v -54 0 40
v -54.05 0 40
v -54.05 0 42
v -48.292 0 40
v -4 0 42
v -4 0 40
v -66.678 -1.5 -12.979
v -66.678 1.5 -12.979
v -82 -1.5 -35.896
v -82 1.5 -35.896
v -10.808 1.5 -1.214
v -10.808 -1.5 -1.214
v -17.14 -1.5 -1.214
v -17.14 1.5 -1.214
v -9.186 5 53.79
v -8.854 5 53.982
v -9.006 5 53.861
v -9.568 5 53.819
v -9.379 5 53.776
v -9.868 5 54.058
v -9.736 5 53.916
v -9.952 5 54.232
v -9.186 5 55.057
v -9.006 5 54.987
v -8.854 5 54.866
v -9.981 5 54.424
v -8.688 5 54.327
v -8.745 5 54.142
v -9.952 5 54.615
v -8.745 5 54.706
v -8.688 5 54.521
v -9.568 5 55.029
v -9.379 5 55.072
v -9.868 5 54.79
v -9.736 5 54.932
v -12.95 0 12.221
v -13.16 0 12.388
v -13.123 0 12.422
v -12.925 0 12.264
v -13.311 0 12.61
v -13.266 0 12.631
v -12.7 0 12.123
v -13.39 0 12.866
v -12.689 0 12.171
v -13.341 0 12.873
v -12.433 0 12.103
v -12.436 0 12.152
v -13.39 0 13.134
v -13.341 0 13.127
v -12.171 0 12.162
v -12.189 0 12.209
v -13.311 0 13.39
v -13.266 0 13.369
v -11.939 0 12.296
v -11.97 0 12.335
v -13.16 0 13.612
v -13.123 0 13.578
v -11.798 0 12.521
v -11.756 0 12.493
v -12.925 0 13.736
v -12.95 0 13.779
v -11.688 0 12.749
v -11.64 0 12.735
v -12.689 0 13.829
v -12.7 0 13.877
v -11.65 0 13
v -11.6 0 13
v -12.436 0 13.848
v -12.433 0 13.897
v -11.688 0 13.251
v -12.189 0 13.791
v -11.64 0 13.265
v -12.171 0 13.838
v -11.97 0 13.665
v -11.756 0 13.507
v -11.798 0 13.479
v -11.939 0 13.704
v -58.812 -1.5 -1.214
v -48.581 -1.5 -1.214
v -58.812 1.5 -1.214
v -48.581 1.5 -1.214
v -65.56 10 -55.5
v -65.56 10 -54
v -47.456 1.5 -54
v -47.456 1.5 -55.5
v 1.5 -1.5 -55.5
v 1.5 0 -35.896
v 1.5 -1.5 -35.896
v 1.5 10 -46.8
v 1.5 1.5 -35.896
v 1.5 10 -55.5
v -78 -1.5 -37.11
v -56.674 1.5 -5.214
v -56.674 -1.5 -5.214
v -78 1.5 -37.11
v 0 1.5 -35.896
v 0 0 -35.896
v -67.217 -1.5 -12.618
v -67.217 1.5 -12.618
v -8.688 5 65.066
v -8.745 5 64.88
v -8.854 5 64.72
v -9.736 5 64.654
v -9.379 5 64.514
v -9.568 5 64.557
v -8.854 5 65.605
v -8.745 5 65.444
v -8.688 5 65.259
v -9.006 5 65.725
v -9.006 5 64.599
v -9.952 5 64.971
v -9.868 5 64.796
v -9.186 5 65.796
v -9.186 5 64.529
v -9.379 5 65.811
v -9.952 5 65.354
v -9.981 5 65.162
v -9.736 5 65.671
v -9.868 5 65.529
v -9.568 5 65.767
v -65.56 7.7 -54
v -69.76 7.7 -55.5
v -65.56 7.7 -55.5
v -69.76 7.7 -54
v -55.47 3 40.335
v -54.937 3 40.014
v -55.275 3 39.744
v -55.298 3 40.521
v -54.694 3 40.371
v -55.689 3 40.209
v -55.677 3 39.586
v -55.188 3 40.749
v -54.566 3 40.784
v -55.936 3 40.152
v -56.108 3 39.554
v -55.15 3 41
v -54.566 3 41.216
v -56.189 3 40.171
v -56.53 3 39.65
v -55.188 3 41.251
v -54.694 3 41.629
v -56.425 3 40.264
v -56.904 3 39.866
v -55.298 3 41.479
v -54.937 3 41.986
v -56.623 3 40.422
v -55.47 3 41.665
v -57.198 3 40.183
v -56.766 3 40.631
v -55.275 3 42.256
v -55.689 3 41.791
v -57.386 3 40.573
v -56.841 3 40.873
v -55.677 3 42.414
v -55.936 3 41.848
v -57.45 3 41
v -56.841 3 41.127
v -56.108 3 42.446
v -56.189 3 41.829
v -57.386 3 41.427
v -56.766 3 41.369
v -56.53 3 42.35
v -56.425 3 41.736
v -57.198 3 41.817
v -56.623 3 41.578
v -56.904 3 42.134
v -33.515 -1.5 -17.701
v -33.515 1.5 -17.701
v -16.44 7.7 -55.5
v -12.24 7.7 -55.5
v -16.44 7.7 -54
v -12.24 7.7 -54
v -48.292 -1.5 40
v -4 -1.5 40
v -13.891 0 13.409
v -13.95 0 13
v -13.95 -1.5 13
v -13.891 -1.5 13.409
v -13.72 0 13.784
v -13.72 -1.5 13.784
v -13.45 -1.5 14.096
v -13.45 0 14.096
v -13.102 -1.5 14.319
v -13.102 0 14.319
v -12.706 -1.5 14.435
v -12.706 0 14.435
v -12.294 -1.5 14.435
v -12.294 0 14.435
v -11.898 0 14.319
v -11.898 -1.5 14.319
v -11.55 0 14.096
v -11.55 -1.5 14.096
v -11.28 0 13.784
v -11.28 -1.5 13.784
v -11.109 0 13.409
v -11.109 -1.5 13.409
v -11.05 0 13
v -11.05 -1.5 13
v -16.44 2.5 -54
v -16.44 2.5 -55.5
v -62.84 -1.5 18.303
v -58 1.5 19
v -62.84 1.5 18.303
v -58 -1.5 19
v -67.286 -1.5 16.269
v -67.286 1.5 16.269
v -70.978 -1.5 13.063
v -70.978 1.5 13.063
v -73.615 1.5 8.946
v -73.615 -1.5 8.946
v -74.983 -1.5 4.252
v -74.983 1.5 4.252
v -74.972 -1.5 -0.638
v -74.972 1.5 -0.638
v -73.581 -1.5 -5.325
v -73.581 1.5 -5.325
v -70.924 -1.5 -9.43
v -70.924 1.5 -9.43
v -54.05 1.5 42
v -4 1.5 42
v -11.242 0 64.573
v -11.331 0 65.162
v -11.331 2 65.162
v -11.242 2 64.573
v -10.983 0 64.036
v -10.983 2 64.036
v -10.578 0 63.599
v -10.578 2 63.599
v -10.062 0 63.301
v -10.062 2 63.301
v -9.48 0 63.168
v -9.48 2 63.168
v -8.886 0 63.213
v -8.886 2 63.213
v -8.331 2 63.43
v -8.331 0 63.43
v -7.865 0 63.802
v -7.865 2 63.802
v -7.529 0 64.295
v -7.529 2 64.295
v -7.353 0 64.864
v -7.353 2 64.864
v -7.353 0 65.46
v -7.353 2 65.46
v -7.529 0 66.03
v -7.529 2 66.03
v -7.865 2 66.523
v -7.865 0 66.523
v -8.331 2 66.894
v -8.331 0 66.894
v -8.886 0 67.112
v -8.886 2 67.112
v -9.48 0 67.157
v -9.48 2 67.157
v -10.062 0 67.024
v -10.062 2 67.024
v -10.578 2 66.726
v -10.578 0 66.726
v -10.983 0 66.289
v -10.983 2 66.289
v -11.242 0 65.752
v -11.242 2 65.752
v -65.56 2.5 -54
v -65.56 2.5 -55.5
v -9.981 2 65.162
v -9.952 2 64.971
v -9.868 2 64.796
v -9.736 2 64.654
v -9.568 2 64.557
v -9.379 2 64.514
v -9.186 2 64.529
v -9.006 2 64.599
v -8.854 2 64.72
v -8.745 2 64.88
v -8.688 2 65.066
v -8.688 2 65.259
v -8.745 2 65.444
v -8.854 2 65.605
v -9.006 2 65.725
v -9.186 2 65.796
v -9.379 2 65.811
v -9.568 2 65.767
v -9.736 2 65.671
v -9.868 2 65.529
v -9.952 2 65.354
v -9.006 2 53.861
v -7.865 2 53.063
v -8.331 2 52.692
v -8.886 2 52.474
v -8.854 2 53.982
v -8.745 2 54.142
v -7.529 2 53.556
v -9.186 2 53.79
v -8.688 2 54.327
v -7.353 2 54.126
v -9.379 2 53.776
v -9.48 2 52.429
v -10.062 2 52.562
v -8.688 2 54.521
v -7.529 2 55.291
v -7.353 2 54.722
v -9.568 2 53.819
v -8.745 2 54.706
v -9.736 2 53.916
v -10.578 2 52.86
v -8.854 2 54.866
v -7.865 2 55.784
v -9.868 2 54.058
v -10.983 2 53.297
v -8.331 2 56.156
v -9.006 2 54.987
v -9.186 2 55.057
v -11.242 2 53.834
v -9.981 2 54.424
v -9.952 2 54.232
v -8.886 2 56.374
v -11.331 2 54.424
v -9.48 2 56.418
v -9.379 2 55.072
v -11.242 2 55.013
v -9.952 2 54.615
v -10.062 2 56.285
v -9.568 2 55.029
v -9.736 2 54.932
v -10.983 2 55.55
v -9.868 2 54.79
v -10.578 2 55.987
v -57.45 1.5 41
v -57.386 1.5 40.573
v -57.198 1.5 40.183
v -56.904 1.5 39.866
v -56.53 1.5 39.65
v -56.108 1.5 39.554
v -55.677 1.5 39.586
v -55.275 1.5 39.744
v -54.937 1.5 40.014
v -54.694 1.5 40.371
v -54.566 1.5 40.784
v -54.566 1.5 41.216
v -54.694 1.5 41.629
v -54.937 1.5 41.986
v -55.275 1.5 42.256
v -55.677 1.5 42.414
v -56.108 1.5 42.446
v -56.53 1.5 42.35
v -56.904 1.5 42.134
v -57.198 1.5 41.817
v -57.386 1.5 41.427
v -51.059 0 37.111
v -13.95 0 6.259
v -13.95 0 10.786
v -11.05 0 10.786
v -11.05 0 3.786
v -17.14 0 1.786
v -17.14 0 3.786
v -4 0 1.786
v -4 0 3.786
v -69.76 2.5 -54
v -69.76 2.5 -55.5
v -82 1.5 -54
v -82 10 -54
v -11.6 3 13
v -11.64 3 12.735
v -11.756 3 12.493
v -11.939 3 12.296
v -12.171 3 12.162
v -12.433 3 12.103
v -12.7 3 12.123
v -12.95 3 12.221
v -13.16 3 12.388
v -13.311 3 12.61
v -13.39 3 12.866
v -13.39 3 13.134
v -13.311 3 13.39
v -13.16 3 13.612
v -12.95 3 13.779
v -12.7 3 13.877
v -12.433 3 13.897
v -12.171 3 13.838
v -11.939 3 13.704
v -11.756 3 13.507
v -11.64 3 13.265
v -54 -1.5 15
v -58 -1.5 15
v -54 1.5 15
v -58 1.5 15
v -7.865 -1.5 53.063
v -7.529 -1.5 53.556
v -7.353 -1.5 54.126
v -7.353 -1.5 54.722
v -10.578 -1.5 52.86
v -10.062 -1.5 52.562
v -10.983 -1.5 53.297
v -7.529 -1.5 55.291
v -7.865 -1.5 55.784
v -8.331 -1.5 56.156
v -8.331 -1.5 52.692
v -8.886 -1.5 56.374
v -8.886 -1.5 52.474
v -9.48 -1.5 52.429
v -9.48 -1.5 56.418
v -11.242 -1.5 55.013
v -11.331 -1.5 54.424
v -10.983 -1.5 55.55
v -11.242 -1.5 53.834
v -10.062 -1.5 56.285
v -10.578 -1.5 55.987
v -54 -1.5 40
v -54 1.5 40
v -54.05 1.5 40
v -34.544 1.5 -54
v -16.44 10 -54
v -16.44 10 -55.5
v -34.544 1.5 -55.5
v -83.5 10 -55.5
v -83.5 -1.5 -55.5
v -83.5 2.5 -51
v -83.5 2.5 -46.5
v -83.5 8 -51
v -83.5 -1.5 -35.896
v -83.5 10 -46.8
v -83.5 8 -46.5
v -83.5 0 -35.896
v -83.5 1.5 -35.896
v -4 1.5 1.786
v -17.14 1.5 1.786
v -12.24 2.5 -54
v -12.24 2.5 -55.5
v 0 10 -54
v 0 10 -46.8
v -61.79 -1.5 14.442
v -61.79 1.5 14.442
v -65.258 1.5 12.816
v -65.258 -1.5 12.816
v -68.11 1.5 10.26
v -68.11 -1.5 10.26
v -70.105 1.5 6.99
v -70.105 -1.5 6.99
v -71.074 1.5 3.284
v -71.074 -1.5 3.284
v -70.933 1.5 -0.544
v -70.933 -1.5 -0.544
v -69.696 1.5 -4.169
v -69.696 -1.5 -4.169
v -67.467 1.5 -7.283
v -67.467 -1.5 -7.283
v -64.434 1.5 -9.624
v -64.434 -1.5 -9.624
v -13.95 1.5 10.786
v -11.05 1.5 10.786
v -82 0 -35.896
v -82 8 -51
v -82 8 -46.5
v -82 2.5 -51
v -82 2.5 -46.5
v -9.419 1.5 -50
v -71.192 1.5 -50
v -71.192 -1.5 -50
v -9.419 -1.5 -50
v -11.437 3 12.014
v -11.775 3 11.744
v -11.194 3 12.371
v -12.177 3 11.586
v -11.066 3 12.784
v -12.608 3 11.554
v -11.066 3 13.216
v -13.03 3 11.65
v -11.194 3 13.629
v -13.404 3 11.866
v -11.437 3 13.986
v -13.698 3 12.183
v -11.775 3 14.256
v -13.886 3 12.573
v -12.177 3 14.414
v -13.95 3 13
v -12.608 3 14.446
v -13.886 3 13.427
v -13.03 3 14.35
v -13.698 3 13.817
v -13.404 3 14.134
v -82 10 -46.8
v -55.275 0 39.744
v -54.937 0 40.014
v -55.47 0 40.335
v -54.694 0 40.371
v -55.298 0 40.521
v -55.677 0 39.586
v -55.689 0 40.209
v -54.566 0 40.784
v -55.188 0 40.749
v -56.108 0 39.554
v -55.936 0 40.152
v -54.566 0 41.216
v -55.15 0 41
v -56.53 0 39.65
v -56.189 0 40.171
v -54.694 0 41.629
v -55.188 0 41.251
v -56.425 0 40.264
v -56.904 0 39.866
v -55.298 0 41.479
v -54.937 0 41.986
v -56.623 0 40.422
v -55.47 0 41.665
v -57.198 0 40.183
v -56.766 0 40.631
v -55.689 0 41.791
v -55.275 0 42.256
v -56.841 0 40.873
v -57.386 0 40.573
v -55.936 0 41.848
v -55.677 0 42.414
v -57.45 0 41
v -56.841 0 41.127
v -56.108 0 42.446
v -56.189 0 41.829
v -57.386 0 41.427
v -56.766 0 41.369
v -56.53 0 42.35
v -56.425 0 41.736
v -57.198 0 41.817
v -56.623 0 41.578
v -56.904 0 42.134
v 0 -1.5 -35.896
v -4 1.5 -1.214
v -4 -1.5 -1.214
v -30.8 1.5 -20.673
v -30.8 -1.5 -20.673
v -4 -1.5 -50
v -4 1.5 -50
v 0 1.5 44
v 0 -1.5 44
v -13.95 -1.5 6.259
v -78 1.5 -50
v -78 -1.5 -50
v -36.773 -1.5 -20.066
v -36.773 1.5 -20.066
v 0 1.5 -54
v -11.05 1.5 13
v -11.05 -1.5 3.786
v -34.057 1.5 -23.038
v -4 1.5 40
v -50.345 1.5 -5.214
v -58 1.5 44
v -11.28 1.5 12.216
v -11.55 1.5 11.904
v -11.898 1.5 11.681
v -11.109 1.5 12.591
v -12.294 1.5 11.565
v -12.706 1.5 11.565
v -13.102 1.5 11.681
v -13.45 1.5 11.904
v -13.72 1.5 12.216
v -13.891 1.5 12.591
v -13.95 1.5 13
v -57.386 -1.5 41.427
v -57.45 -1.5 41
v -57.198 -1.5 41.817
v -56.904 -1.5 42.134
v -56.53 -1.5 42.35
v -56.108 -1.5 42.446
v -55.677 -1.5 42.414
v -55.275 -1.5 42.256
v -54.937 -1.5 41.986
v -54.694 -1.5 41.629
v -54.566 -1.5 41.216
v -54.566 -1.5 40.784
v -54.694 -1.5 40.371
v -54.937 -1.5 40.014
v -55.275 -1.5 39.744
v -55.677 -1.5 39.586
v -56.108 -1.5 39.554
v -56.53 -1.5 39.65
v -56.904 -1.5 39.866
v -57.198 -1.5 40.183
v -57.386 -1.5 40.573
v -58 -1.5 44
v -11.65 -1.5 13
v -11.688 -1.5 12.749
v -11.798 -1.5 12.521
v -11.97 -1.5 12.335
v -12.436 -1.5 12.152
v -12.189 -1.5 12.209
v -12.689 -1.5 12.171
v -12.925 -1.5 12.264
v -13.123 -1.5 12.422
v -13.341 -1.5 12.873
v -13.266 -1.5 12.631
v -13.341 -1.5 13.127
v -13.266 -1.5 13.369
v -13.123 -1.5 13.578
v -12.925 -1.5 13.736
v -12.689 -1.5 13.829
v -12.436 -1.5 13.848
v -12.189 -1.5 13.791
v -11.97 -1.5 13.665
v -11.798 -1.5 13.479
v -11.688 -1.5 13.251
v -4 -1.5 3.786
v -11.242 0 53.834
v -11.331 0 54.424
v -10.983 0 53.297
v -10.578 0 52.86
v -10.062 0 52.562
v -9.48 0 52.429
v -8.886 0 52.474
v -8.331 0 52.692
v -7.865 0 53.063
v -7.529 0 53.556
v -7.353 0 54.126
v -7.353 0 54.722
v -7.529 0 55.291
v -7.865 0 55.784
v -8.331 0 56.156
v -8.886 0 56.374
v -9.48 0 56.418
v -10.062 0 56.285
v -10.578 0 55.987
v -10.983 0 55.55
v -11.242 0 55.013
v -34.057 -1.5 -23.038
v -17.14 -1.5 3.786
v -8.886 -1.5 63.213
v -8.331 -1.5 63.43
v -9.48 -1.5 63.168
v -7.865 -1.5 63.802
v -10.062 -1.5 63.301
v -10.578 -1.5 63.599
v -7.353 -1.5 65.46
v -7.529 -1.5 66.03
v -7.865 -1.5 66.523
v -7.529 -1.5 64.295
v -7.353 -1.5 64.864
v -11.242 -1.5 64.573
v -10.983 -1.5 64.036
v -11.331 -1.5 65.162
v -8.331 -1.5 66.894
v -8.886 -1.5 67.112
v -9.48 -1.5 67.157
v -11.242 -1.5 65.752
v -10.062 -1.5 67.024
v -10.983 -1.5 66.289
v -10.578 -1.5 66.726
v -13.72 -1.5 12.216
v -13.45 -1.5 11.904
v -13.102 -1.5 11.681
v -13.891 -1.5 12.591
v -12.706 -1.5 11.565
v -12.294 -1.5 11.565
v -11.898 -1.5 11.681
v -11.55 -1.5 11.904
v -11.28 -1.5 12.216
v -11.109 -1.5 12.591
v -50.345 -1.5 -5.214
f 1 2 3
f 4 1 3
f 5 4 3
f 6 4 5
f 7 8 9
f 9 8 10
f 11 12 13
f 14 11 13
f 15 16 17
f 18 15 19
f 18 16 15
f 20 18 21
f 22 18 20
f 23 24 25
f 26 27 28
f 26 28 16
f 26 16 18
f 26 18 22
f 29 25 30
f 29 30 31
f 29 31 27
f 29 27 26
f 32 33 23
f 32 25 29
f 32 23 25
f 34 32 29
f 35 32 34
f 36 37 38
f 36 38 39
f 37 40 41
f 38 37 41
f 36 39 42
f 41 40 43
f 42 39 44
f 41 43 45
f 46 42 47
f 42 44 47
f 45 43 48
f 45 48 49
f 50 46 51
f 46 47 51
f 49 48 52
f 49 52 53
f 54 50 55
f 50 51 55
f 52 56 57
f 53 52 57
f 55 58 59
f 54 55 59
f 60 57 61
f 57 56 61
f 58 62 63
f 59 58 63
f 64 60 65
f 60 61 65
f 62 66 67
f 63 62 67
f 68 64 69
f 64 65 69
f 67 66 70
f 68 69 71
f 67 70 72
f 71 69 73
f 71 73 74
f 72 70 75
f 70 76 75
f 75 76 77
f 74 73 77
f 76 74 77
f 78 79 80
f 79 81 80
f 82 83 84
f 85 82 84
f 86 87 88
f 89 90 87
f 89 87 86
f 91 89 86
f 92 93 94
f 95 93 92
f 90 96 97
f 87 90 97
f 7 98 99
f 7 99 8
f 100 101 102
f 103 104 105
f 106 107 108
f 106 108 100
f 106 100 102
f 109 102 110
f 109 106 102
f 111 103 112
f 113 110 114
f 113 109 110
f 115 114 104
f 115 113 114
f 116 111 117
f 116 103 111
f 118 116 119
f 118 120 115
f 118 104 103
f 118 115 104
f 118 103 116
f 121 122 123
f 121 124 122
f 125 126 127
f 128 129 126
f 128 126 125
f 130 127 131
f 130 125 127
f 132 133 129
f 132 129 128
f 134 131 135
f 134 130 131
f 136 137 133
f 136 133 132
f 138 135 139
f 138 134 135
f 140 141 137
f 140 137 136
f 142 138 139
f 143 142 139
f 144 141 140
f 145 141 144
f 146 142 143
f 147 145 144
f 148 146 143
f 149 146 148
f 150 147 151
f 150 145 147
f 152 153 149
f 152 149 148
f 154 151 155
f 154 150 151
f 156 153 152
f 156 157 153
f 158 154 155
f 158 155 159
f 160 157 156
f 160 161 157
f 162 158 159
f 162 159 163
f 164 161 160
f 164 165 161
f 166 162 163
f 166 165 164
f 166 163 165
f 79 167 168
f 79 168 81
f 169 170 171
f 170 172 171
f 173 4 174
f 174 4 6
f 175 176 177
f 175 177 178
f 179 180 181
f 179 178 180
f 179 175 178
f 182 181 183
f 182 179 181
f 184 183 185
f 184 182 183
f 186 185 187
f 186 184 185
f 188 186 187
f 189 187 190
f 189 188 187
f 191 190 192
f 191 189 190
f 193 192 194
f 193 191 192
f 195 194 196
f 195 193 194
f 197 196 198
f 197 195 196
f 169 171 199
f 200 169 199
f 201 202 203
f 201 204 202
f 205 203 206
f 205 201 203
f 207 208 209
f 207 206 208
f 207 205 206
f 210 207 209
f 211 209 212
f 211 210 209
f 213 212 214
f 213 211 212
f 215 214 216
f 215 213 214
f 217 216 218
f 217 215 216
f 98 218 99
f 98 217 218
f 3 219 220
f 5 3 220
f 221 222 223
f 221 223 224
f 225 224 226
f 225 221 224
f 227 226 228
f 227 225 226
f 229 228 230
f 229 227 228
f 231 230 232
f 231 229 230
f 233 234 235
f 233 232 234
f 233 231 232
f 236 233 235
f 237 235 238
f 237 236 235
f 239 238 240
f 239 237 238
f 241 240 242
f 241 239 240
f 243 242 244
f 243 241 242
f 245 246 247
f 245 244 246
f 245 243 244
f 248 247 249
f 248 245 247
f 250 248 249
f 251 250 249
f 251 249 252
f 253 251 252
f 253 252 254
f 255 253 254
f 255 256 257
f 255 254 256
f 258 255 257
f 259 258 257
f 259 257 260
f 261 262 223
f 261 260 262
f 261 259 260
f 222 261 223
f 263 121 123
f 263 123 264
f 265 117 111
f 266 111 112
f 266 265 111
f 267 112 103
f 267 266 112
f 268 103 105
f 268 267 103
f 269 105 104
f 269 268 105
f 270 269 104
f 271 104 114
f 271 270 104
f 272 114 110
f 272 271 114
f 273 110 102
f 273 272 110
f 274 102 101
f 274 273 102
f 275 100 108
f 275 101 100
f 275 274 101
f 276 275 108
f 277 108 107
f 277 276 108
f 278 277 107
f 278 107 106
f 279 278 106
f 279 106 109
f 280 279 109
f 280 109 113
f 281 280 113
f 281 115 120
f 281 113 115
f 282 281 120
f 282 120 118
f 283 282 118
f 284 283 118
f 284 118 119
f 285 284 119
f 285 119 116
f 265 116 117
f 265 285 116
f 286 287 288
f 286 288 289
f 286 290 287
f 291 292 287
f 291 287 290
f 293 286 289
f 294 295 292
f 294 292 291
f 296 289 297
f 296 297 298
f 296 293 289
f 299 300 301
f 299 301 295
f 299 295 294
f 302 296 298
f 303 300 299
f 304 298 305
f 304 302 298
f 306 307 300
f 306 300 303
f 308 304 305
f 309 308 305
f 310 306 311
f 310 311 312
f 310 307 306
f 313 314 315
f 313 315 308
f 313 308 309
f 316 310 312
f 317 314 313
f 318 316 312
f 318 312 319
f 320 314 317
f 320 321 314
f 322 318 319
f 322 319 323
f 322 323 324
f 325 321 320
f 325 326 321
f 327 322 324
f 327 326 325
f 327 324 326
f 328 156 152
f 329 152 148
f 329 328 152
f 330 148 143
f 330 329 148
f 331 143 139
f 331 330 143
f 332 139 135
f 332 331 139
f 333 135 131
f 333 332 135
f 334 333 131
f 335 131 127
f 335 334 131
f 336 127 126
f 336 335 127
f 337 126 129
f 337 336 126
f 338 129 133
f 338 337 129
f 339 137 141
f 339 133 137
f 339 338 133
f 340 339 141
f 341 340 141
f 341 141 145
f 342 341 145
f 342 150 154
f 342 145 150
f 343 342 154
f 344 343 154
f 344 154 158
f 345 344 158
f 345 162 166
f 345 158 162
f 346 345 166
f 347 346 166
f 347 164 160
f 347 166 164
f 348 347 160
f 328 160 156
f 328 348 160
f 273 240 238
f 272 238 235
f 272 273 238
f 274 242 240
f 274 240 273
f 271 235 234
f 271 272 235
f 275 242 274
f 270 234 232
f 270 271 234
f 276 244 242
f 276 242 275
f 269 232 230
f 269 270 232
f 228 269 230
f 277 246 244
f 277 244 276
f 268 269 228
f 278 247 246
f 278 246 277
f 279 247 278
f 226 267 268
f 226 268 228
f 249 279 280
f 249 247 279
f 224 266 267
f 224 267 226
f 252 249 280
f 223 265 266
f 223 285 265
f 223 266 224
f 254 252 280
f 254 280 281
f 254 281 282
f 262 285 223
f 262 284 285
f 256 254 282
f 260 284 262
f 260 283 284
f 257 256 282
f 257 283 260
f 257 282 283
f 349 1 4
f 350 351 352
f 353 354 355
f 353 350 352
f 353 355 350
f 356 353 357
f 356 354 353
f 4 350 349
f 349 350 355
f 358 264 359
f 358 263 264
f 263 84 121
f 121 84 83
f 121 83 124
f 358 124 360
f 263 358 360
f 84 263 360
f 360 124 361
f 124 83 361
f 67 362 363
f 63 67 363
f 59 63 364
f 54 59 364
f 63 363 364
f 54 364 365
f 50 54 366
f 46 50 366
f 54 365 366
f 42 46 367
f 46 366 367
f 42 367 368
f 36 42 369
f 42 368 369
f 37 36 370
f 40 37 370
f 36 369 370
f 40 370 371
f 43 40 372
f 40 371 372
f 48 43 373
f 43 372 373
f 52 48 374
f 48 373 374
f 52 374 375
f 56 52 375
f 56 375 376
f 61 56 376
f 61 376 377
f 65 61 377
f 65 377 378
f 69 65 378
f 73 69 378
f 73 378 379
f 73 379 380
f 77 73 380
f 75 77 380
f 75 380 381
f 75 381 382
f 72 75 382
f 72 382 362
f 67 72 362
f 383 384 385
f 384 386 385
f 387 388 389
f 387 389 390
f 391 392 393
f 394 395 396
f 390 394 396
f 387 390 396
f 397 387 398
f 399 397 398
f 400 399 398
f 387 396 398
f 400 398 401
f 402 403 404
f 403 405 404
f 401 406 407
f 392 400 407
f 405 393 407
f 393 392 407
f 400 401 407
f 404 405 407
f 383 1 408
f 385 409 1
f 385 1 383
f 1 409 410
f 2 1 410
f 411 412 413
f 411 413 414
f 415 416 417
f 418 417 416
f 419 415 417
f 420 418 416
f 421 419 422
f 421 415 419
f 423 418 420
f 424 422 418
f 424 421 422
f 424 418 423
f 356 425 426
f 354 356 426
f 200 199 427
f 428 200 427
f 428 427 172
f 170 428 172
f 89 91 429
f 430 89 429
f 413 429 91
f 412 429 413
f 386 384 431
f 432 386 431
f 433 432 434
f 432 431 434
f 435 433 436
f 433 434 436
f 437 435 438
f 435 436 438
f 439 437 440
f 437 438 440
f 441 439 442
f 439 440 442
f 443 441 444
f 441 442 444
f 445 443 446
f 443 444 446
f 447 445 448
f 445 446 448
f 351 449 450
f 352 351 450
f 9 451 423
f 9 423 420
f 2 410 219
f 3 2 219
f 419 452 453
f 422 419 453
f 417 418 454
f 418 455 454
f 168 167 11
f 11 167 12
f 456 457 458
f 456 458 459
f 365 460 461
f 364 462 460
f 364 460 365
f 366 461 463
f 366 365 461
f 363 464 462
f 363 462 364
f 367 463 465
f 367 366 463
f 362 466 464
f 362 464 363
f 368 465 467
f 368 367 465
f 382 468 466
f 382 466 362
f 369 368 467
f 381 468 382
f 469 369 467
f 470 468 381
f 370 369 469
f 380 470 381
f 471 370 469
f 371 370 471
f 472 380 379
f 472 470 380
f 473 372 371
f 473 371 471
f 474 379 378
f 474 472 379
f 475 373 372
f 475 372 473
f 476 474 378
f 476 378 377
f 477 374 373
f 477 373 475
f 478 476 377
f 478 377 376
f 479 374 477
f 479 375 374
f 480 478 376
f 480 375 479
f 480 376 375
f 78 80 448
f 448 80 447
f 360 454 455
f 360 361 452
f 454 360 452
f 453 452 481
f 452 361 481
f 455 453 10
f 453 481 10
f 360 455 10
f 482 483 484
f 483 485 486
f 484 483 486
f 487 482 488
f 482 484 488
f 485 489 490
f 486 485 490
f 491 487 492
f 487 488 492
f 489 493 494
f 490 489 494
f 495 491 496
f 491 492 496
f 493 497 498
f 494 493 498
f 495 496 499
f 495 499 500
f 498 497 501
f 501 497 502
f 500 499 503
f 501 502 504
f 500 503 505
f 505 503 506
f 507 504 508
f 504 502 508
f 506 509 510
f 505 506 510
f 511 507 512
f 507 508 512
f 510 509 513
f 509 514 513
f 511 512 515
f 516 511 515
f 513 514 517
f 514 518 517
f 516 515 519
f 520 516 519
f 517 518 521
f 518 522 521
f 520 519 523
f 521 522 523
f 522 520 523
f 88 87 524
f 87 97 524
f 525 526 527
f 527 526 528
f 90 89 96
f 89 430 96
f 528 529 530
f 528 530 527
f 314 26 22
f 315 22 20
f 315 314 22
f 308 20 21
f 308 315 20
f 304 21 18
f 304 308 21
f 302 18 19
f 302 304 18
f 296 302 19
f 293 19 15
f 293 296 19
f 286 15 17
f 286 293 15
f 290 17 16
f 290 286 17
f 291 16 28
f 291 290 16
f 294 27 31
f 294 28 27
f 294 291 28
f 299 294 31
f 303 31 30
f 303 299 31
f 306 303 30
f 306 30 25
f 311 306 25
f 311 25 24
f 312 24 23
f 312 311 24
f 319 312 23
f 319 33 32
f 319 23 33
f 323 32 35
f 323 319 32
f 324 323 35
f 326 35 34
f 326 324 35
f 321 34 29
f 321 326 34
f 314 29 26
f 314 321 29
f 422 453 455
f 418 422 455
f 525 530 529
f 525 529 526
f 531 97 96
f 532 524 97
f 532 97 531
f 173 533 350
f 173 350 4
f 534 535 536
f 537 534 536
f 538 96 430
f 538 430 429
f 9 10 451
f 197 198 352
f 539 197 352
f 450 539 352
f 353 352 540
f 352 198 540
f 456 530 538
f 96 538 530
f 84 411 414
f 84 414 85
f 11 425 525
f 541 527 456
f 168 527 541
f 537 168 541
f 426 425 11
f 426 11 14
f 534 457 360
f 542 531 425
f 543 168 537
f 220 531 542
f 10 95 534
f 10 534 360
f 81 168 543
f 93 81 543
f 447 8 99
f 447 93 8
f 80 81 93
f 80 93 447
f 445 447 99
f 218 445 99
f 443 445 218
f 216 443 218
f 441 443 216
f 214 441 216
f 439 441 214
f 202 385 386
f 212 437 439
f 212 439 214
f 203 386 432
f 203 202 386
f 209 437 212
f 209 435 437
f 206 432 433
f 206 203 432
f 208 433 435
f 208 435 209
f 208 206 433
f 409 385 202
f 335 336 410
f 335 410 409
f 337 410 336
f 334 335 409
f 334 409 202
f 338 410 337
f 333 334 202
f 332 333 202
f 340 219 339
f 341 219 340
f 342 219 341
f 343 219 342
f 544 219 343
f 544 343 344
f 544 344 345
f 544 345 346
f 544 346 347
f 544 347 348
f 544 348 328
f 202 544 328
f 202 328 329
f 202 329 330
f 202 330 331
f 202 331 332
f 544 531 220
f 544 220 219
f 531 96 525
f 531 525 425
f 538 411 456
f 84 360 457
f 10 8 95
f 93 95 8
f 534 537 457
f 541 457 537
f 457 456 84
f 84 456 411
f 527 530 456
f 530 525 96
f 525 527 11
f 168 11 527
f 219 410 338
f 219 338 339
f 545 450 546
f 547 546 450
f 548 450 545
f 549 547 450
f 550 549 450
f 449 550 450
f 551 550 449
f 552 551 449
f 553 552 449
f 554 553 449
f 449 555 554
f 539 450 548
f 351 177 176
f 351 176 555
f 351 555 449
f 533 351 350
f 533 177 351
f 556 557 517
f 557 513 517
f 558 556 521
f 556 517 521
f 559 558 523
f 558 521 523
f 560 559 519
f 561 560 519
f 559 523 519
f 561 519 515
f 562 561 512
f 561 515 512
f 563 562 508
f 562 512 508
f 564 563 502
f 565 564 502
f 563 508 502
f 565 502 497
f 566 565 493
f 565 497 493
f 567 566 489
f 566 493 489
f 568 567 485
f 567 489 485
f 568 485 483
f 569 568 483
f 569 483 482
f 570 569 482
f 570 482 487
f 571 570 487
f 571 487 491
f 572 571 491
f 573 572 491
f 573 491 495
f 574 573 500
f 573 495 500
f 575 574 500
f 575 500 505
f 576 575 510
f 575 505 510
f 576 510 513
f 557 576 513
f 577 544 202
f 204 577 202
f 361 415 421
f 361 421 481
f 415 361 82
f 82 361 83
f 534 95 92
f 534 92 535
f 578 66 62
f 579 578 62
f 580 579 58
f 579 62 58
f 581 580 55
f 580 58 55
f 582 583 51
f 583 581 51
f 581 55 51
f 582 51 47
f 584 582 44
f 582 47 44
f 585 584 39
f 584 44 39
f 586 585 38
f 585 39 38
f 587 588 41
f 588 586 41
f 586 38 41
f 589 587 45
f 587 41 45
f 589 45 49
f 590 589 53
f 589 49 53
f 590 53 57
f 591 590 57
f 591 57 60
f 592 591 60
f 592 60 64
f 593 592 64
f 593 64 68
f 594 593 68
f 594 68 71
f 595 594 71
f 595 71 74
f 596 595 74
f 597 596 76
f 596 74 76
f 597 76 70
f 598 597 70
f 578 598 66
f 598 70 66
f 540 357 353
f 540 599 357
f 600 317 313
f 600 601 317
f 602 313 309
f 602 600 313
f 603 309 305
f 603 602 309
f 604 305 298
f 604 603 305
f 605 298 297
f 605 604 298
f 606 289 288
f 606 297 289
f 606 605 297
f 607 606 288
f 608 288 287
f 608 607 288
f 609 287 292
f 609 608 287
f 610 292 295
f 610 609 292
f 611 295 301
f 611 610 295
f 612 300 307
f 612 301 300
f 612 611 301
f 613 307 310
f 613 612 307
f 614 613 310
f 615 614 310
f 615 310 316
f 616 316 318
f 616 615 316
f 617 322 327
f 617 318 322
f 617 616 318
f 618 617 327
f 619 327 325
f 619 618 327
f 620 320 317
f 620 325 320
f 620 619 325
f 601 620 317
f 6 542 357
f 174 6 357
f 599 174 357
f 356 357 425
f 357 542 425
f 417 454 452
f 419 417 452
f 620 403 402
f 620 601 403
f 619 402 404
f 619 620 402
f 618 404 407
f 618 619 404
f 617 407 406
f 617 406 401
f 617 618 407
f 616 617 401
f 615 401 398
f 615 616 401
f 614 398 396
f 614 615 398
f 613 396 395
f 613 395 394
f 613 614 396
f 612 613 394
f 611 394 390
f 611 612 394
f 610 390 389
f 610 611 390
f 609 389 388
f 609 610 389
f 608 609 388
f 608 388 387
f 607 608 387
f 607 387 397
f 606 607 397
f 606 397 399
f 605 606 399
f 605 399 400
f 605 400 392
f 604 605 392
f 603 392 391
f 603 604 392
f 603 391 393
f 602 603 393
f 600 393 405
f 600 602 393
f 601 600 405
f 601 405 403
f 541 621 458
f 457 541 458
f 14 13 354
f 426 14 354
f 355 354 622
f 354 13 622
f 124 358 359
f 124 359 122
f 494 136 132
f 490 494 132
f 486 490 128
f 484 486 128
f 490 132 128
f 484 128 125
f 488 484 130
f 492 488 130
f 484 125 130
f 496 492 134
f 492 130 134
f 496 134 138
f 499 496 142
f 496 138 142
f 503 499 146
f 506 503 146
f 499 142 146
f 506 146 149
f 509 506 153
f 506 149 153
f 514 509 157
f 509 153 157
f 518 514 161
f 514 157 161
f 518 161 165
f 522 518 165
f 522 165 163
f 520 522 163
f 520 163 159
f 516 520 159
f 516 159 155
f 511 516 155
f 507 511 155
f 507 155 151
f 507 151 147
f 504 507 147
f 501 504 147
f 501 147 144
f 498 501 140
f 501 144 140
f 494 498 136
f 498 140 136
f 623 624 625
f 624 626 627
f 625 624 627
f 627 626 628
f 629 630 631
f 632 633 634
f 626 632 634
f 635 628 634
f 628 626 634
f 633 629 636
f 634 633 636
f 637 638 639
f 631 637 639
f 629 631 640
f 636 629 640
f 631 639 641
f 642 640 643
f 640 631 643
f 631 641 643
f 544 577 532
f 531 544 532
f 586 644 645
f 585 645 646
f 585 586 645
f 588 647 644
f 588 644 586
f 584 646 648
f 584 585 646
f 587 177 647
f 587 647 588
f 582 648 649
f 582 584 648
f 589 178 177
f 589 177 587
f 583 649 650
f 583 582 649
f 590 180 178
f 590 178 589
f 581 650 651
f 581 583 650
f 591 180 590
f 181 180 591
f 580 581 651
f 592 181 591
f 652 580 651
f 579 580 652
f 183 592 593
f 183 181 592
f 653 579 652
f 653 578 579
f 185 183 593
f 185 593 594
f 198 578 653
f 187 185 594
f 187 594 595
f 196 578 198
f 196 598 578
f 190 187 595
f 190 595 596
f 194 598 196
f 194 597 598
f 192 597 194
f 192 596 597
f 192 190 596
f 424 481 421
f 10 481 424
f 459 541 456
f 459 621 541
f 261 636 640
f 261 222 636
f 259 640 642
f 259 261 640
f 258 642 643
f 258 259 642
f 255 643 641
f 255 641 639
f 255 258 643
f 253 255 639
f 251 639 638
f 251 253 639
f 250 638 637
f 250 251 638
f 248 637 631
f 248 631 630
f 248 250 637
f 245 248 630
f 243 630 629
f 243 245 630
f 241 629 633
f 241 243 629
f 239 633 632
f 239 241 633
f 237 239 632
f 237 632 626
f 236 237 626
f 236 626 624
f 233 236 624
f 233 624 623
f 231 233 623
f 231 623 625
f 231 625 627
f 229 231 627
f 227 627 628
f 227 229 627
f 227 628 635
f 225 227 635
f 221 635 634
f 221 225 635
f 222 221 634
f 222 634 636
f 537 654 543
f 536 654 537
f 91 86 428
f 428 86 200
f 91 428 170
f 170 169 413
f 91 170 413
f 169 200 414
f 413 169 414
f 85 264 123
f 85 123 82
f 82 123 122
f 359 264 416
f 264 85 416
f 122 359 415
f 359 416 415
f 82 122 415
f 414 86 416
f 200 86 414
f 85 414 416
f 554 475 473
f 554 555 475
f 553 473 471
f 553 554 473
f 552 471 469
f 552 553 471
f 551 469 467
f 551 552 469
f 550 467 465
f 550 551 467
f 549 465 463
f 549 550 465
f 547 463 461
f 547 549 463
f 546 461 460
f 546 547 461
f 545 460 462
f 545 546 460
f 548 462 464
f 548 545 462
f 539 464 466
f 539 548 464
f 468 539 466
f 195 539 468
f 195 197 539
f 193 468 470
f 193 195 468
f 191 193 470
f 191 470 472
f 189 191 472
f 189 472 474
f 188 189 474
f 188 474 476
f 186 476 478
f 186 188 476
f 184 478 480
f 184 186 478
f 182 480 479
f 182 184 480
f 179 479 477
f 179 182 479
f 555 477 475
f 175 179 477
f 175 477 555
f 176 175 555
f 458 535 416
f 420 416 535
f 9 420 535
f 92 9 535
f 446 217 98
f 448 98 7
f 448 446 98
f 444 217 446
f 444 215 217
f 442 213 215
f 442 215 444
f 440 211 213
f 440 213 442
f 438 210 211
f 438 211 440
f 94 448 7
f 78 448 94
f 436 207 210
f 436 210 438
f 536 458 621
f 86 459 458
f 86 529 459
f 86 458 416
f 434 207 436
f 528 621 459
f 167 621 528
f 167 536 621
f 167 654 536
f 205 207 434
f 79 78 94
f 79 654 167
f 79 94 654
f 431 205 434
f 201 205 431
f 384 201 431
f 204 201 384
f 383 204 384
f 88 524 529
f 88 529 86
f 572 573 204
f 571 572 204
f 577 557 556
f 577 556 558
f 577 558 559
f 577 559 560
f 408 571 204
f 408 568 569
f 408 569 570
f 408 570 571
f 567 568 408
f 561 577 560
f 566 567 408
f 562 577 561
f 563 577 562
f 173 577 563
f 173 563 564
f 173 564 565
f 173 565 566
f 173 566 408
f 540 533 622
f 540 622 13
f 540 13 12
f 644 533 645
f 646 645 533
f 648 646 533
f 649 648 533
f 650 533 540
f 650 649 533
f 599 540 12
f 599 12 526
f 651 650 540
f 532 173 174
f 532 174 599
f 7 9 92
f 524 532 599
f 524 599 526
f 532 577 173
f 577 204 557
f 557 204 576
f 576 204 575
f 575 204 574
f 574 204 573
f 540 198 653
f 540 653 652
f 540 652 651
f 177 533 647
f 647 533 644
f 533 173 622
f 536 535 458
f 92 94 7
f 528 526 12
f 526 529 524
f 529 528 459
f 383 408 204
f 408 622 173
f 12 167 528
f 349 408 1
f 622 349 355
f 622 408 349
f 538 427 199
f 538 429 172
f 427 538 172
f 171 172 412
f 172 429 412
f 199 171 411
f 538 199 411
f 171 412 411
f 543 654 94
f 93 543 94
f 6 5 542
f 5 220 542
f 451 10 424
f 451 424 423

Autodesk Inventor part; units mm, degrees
ref_plane "YZ Plane" through (0, 0, 0) normal (1, 0, 0) x (0, 1, 0)
ref_plane "XZ Plane" through (0, 0, 0) normal (0, 1, 0) x (-1, 0, 0)
ref_plane "XY Plane" through (0, 0, 0) normal (0, 0, 1) x (1, 0, 0)
sketch "Sketch1" plane through (0, 0, 0) normal (0, 1, 0) x (-1, 0, 0)
  line L0 (82, -54) -> (0, -54)
  line L1 (0, -54) -> (0, 0)
  line L2 (58, 44) -> (0, 44)
  line L3 (0, 44) -> (0, 0)
  circle A0 centre (56, 41) radius 1.45
  circle A1 centre (12.5, 13) radius 1.45
  line L4 (82, -54) -> (82, -35.896)
  line L5 (54.6748, -2.2232) -> (78, -37.11)
  line L6 (78, -37.11) -> (78, -50)
  line L7 (78, -50) -> (4, -50)
  line L8 (4, -50) -> (4, 0)
  line L9 (54, 40) -> (4, 40)
  line L10 (4, 40) -> (4, 0)
  line L11 (54.6748, -2.2232) -> (54, -1.214)
  line L12 (54, -1.214) -> (9.4186, -50)
  line L13 (4, -50) -> (48.5814, -1.214)
  line L14 (78, -50) -> (10.8081, -1.214)
  line L15 (4, -1.214) -> (71.1919, -50)
  line L16 (11.05, 13) -> (11.05, 9.6245)
  line L17 (13.95, 13) -> (13.95, 12.0261)
  line L18 (11.05, 9.6245) -> (11.05, 3.786)
  line L19 (13.95, 12.0261) -> (13.95, 3.786)
  line L20 (54, 40) -> (17.1403, 3.786)
  line L21 (13.95, 6.2591) -> (48.2925, 40)
  line L22 (3.6116, 3.786) -> (17.1403, 3.786)
  line L23 (4, -1.214) -> (17.1403, -1.214)
  line L24 (17.1403, -1.214) -> (17.1403, 3.786)
  line L25 (48.5814, -1.214) -> (54, -1.214)
  line L26 (44.9262, -5.214) -> (56.6744, -5.214)
  line L27 (58, 44) -> (58, 15)
  line L28 (58, 15) -> (54, 15)
  line L29 (54, 40) -> (54, 15)
  line L30 (54, -1.214) -> (58.8117, -1.214)
  line L31 (58.8117, -1.214) -> (82, -35.896)
  arc A2 (64.4344, -9.6237) -> (58, 15) centre (58, 1.8475) ccw
  arc A3 (67.2169, -12.6183) -> (58, 19) centre (58, 1.8475) ccw
  line L32 (67.2169, -12.6183) -> (66.6776, -12.9789)
  point P0 (4, 0)
  point P1 (4, 2.786)
  point P2 (54, 2.786)
  point P3 (10.2713, 40)
  point P4 (10.2713, 2.786)
  point P5 (47.7287, 40)
  point P6 (33.5153, -17.701)
  point P7 (30.7999, -20.6726)
  point P8 (34.0572, -23.0376)
  point P9 (36.7727, -20.0661)
  point P10 (13.95, 40)
  point P11 (19.4764, 40)
  point P12 (4, 3.786)
  point P13 (11.05, 3.786)
  point P14 (10.8081, -1.214)
  point P15 (50.3447, -5.214)
  point P16 (67.0734, -13.5707)
  dimension "d0" = 82
  dimension "d1" = 54
  dimension "d2" = 44
  dimension "d5" = 3
  dimension "d6" = 2.9
  dimension "d8" = 12.5
  dimension "d9" = 2.9
  dimension "d36" = 18.104
  dimension "d94" = 90
  dimension "d95" = 90
  dimension "d96" = 31
  dimension "d97" = 4
  dimension "d98" = 4
  dimension "d103" = 4
  dimension "d104" = 4
  dimension "d112" = 4
  dimension "d113" = 44.494
  dimension "d121" = 134.494
  dimension "d122" = 135.506
  dimension "d123" = 13.5287
  dimension "d124" = 13.1403
  dimension "d125" = 90
  dimension "d126" = 54.018
  dimension "d127" = 42.422
  dimension "d128" = 4
  dimension "d129" = 4
  dimension "d130" = 146.233
  dimension "d131" = 11.7482
  dimension "d132" = 25
  dimension "d133" = 51.673
  dimension "d134" = 4
  dimension "d140" = 2
  dimension "d141" = 17.1526
  dimension "d155" = 58
extrude "Extrusion1" add sketch "Sketch1" along normal blind 1.5 contours L0 L1 L3 L2 L27 L28 L29 L9 L10 L8 L7 L6 L5 L11 L30 L31 L4 | L31 A2 L27 A3 L32 | L11 L5 L26 L12 | L12 L26 L13 L25 | L12 L14 L13 L26 | L20 L22 L19 L21 L9 | L14 L7 L15 L12 | L12 L15 L13 L14 | L24 L23 L8 L10 L22 | L12 L7 L13 L15 | L13 L15 L23 L14 | L19 L22 L18 L16 A1 L17 | A0
sketch "Sketch2" plane through (0, 0, -54) normal (0, 0, -1) x (-1, 0, 0)
  line L0 (58, 0) -> (0, 0) projected
  line L1 (0, 0) -> (82, 0)
  line L2 (0, 10) -> (0, 0)
  line L3 (12.24, 7.7) -> (16.44, 7.7)
  line L4 (16.44, 7.7) -> (16.44, 2.5)
  line L5 (16.44, 2.5) -> (12.24, 2.5)
  line L6 (12.24, 2.5) -> (12.24, 7.7)
  line L7 (0, 1.5) -> (82, 1.5) projected
  line L8 (41, 10) -> (41, 0) construction
  line L9 (0, 10) -> (16.44, 10)
  line L10 (16.44, 10) -> (34.5439, 1.5)
  line L11 (58, 1.5) -> (0, 1.5) projected
  line L12 (24, 0) -> (82, 0)
  line L13 (82, 0) -> (0, 0)
  line L14 (82, 10) -> (82, 0)
  line L15 (69.76, 7.7) -> (65.56, 7.7)
  line L16 (65.56, 7.7) -> (65.56, 2.5)
  line L17 (65.56, 2.5) -> (69.76, 2.5)
  line L18 (69.76, 2.5) -> (69.76, 7.7)
  line L19 (82, 1.5) -> (0, 1.5)
  line L20 (82, 10) -> (65.56, 10)
  line L21 (65.56, 10) -> (47.4561, 1.5)
  line L22 (24, 1.5) -> (82, 1.5)
  line L23 (0, 0) -> (0, 1.5) projected
  line L24 (0, 0) -> (82, 0)
  line L25 (82, 0) -> (82, -1.5)
  line L26 (82, -1.5) -> (0, -1.5)
  line L27 (0, -1.5) -> (0, 0)
  point P0 (47.4561, 1.5)
  dimension "d13" = 10
  dimension "d14" = 12.24
  dimension "d16" = 4.2
  dimension "d17" = 5.2
  dimension "d18" = 1
  dimension "d34" = 20
  dimension "d35" = 16.44
  dimension "d137" = 1.5
extrude "Extrusion2" add sketch "Sketch2" along normal blind 1.5
sketch "Sketch4" plane through (0, 1.5, -54) normal (1, 0, 0) x (0, 0, -1)
  line L0 (0, 0) -> (0, 8.5) projected
  line L1 (-98, 0) -> (0, 0) projected
  line L2 (-18.104, 0) -> (-18.104, -1.5)
  line L3 (-98, -1.5) -> (0, -1.5) projected
  line L4 (0, 8.5) -> (1.5, 8.5) projected
  line L5 (0, 8.5) -> (-7.2, 8.5)
  line L6 (0, 0) -> (-18.104, 0) projected
  line L7 (-7.2, 8.5) -> (-18.104, 0)
  line L8 (0, -1.5) -> (-18.104, -1.5) projected
  line L9 (-18.104, -1.5) -> (1.5, -1.5)
  line L10 (0, 0) -> (1.5, 0) projected
  line L11 (1.5, -1.5) -> (1.5, 0)
  line L12 (1.5, 0) -> (-18.104, 0)
  line L13 (1.5, 0) -> (1.5, 8.5)
  line L14 (0, 8.5) -> (1.5, 8.5) projected
  line L15 (1.5, 8.5) -> (0, 8.5)
  line L16 (-18.104, -1.5) -> (-18.104, 0) projected
  line L17 (-18.104, -1.5) -> (-18.104, -3)
  line L18 (-18.104, -3) -> (1.5, -3)
  line L19 (1.5, -3) -> (1.5, -1.5)
  point P0 (-54, -1.5)
  dimension "d135" = 7.2
  dimension "d136" = 1.5
extrude "Extrusion3" add sketch "Sketch4" along normal blind 1.5 contours L1 L7 L5 L0 | L0 L4 L13 L10 | L3 L9 L19 L18 L17
sketch "Sketch6" plane through (0, 0, -55.5) normal (1, 0, 0) x (0, 0, -1)
  line L0 (-99.5, 1.5) -> (-19.604, 1.5) projected
  line L1 (-19.6039, 1.5) -> (-19.6039, 0)
  line L2 (-99.5, 0) -> (-19.604, 0) projected
  line L3 (-19.6039, 0) -> (0, 0)
  line L4 (-1.5, 10) -> (0, 10) projected
  line L5 (0, 0) -> (0, 10)
  line L6 (-19.6039, 1.5) -> (-1.5, 1.5)
  line L7 (-1.5, 1.5) -> (-1.5, 10) projected
  line L8 (-1.5, 10) -> (-1.5, 1.5)
  line L9 (0, 10) -> (-1.5, 10)
  point P0 (-55.5, 0)
  point P1 (-1.5, 0)
  point P2 (-1.5, 0)
extrude "Extrusion4" add sketch "Sketch6" along normal blind 1.5
sketch "Sketch7" plane through (-82, 0, 0) normal (-1, 0, 0) x (0, 0, 1)
  line L0 (-54, 10) -> (-35.8961, 1.5)
  line L1 (-35.8961, 1.5) -> (-35.8961, 0)
  line L2 (0, 0) -> (-55.5, 0) projected
  line L3 (-35.8961, 0) -> (-55.5, 0)
  line L4 (-55.5, 0) -> (-55.5, 10)
  line L5 (-55.5, 10) -> (-54, 10)
  line L6 (-51, 8) -> (-46.5, 8)
  line L7 (-46.5, 8) -> (-46.5, 2.5)
  line L8 (-46.5, 2.5) -> (-51, 2.5)
  line L9 (-51, 2.5) -> (-51, 8)
  line L10 (-54, 1.5) -> (0, 1.5) projected
  line L11 (-54, 10) -> (-46.8, 10)
  line L12 (-35.896, 1.5) -> (-35.8961, 1.5) projected
  line L13 (-46.8, 10) -> (-35.8961, 1.5)
  line L14 (-55.5, 0) -> (-35.896, 0)
  line L15 (-35.896, 0) -> (-35.896, -1.5)
  line L16 (-35.896, -1.5) -> (-55.5, -1.5)
  line L17 (-55.5, -1.5) -> (-55.5, 0)
  point P0 (-54, 0)
  point P1 (-54, 0)
  dimension "d26" = 4.5
  dimension "d27" = 4.5
  dimension "d28" = 5.5
  dimension "d29" = 1
  dimension "d30" = 13.8255
extrude "Extrusion5" add sketch "Sketch7" along normal blind 1.5 contours L11 L13 L0 L7 L6 | L0 L6 L9 L8 L7 L1 L2 L4 L5 | L2 L15 L16 L17
extrude "Extrusion6" add sketch "Sketch1" along normal blind 3 contours A1 | A0
sketch "Sketch15" plane through (-56, 3, 41) normal (0, 1, 0) x (1, 0, 0)
  circle A0 centre (0, 0) radius 1.45 projected
  circle A1 centre (0, 0) radius 0.85
  arc A2 (42.05, 28) -> (44.95, 28) centre (43.5, 28) ccw projected
  circle A3 centre (43.5, 28) radius 0.9
  point P0 (56, 41)
  dimension "d76" = 1.7
  dimension "d110" = 1.8
extrude "Extrusion10" cut sketch "Sketch15" against normal up to surface (3 mm away) contours A1 | A3
sketch "Sketch16" plane through (0, 0, 0) normal (0, 1, 0) x (-1, 0, 0)
  circle A0 centre (9.3309, 54.4237) radius 2
  circle A1 centre (9.3309, 54.4237) radius 0.65
  line L0 (58, 44) -> (0, 44) projected
  line L1 (7.831, 59.7931) -> (15.9352, 59.7931) construction
  circle A2 centre (9.3309, 65.1624) radius 2
  circle A3 centre (9.3309, 65.1624) radius 0.65
  point P0 (0, 0)
  dimension "d80" = 4
  dimension "d81" = 1.3
extrude "Extrusion11" add sketch "Sketch16" along normal blind 2 contours A2 | A3
extrude "Extrusion12" add sketch "Sketch16" along normal blind 2 contours A0 | A1
extrude "Extrusion13" add sketch "Sketch16" along normal blind 5 contours A1 | A3
extrude "Extrusion14" add sketch "Sketch1" against normal blind 1.5 contours L31 A2 L27 A3 L32 | L11 L5 L26 L12 | L12 L26 L13 L25 | L12 L14 L13 L26 | L20 L22 L19 L21 L9 | L14 L7 L15 L12 | L12 L15 L13 L14 | L24 L23 L8 L10 L22 | L12 L7 L13 L15 | L13 L15 L23 L14 | L19 L22 L18 L16 A1 L17
extrude "Extrusion15" [suppressed]
extrude "Extrusion16" add sketch "Sketch1" against normal blind 1.5 contours L0 L1 L3 L2 L27 L28 L29 L9 L10 L8 L7 L6 L5 L11 L30 L31 L4 | L12 L26 L13 L25 | L12 L14 L13 L26 | L20 L22 L19 L21 L9 | L12 L15 L13 L14 | L24 L23 L8 L10 L22 | L12 L7 L13 L15 | L13 L15 L23 L14 | L19 L22 L18 L16 A1 L17
sketch "Sketch24" plane through (0, 0, 0) normal (0, -1, 0) x (1, 0, 0)
  point P0 (0, 0)
extrude "Extrusion17" add sketch "Sketch16" against normal blind 1.5 contours A0 | A1 | A2 | A3
sketch "Sketch25" plane through (0, 1.5, 0) normal (0, 1, 0) x (1, 0, 0)
  line L0 (-4, -3.786) -> (-4, -40) projected
  line L1 (-4, -3.786) -> (-4, -1.786)
  line L2 (-4, -1.786) -> (-7.525, -1.786)
  line L3 (-11.05, -3.786) -> (-4, -3.786) projected
  line L4 (-7.525, -1.786) -> (-17.1403, -1.786)
  line L5 (-17.1403, -3.786) -> (-17.1403, 1.214) projected
  line L6 (-17.1403, -1.786) -> (-17.1403, -3.786)
  line L7 (-17.1403, -3.786) -> (-51.0593, -37.1109)
  line L8 (-54, -40) -> (-17.1403, -3.786) projected
  line L9 (-48.2925, -40) -> (-13.95, -6.2591) projected
  line L10 (-48.256, -39.9642) -> (-13.95, -6.2591)
  line L11 (-13.95, -6.2591) -> (-13.95, -10.786)
  line L12 (-13.95, -6.2591) -> (-13.95, -13) projected
  line L13 (-13.95, -10.786) -> (-11.05, -10.786)
  line L14 (-11.05, -13) -> (-11.05, -3.786) projected
  line L15 (-11.05, -10.786) -> (-11.05, -3.786)
  line L16 (-11.05, -3.786) -> (-7.525, -3.786)
  line L17 (-4, -3.786) -> (-7.525, -3.786)
  line L18 (-51.0593, -37.1109) -> (-54, -40)
  line L19 (-54, -15) -> (-54, -40) projected
  line L20 (-48.2925, -40) -> (-54, -40)
  point P0 (0, 0)
  dimension "d142" = 2
  dimension "d143" = 45.506
  dimension "d144" = 7
extrude "Extrusion18" cut sketch "Sketch25" against normal blind 1.5
sketch "Sketch26" plane through (0, 0, 0) normal (0, -1, 0) x (1, 0, 0)
  arc A0 (-11.05, 13) -> (-13.95, 13) centre (-12.5, 13) ccw projected
  circle A1 centre (-12.5, 13) radius 1.45
  circle A2 centre (-12.5, 13) radius 0.85
  point P0 (0, 0)
extrude "Extrusion19" add sketch "Sketch26" along normal blind 1.5
sketch "Sketch27" plane through (0, 1.5, 0) normal (0, 1, 0) x (1, 0, 0)
  line L0 (-48.2925, -40) -> (-4, -40) projected
  line L1 (-4, -40) -> (-54.05, -40)
  line L2 (-54.05, -40) -> (-54.05, -42)
  line L3 (-54.05, -42) -> (-4, -42)
  line L4 (-4, -42) -> (-4, -40)
  line L5 (-54, -40) -> (-54, -15) projected
  circle A0 centre (-56, -41) radius 1.45 projected
  point P0 (0, 0)
  dimension "d150" = 2
  dimension "d154" = 0.5
extrude "Extrusion20" cut sketch "Sketch27" against normal blind 1.5 contours L0 L4 L3 L2 L1
properties part number "OscarNoring240sSkalV.1Microdator" material "PBT Plastic"
